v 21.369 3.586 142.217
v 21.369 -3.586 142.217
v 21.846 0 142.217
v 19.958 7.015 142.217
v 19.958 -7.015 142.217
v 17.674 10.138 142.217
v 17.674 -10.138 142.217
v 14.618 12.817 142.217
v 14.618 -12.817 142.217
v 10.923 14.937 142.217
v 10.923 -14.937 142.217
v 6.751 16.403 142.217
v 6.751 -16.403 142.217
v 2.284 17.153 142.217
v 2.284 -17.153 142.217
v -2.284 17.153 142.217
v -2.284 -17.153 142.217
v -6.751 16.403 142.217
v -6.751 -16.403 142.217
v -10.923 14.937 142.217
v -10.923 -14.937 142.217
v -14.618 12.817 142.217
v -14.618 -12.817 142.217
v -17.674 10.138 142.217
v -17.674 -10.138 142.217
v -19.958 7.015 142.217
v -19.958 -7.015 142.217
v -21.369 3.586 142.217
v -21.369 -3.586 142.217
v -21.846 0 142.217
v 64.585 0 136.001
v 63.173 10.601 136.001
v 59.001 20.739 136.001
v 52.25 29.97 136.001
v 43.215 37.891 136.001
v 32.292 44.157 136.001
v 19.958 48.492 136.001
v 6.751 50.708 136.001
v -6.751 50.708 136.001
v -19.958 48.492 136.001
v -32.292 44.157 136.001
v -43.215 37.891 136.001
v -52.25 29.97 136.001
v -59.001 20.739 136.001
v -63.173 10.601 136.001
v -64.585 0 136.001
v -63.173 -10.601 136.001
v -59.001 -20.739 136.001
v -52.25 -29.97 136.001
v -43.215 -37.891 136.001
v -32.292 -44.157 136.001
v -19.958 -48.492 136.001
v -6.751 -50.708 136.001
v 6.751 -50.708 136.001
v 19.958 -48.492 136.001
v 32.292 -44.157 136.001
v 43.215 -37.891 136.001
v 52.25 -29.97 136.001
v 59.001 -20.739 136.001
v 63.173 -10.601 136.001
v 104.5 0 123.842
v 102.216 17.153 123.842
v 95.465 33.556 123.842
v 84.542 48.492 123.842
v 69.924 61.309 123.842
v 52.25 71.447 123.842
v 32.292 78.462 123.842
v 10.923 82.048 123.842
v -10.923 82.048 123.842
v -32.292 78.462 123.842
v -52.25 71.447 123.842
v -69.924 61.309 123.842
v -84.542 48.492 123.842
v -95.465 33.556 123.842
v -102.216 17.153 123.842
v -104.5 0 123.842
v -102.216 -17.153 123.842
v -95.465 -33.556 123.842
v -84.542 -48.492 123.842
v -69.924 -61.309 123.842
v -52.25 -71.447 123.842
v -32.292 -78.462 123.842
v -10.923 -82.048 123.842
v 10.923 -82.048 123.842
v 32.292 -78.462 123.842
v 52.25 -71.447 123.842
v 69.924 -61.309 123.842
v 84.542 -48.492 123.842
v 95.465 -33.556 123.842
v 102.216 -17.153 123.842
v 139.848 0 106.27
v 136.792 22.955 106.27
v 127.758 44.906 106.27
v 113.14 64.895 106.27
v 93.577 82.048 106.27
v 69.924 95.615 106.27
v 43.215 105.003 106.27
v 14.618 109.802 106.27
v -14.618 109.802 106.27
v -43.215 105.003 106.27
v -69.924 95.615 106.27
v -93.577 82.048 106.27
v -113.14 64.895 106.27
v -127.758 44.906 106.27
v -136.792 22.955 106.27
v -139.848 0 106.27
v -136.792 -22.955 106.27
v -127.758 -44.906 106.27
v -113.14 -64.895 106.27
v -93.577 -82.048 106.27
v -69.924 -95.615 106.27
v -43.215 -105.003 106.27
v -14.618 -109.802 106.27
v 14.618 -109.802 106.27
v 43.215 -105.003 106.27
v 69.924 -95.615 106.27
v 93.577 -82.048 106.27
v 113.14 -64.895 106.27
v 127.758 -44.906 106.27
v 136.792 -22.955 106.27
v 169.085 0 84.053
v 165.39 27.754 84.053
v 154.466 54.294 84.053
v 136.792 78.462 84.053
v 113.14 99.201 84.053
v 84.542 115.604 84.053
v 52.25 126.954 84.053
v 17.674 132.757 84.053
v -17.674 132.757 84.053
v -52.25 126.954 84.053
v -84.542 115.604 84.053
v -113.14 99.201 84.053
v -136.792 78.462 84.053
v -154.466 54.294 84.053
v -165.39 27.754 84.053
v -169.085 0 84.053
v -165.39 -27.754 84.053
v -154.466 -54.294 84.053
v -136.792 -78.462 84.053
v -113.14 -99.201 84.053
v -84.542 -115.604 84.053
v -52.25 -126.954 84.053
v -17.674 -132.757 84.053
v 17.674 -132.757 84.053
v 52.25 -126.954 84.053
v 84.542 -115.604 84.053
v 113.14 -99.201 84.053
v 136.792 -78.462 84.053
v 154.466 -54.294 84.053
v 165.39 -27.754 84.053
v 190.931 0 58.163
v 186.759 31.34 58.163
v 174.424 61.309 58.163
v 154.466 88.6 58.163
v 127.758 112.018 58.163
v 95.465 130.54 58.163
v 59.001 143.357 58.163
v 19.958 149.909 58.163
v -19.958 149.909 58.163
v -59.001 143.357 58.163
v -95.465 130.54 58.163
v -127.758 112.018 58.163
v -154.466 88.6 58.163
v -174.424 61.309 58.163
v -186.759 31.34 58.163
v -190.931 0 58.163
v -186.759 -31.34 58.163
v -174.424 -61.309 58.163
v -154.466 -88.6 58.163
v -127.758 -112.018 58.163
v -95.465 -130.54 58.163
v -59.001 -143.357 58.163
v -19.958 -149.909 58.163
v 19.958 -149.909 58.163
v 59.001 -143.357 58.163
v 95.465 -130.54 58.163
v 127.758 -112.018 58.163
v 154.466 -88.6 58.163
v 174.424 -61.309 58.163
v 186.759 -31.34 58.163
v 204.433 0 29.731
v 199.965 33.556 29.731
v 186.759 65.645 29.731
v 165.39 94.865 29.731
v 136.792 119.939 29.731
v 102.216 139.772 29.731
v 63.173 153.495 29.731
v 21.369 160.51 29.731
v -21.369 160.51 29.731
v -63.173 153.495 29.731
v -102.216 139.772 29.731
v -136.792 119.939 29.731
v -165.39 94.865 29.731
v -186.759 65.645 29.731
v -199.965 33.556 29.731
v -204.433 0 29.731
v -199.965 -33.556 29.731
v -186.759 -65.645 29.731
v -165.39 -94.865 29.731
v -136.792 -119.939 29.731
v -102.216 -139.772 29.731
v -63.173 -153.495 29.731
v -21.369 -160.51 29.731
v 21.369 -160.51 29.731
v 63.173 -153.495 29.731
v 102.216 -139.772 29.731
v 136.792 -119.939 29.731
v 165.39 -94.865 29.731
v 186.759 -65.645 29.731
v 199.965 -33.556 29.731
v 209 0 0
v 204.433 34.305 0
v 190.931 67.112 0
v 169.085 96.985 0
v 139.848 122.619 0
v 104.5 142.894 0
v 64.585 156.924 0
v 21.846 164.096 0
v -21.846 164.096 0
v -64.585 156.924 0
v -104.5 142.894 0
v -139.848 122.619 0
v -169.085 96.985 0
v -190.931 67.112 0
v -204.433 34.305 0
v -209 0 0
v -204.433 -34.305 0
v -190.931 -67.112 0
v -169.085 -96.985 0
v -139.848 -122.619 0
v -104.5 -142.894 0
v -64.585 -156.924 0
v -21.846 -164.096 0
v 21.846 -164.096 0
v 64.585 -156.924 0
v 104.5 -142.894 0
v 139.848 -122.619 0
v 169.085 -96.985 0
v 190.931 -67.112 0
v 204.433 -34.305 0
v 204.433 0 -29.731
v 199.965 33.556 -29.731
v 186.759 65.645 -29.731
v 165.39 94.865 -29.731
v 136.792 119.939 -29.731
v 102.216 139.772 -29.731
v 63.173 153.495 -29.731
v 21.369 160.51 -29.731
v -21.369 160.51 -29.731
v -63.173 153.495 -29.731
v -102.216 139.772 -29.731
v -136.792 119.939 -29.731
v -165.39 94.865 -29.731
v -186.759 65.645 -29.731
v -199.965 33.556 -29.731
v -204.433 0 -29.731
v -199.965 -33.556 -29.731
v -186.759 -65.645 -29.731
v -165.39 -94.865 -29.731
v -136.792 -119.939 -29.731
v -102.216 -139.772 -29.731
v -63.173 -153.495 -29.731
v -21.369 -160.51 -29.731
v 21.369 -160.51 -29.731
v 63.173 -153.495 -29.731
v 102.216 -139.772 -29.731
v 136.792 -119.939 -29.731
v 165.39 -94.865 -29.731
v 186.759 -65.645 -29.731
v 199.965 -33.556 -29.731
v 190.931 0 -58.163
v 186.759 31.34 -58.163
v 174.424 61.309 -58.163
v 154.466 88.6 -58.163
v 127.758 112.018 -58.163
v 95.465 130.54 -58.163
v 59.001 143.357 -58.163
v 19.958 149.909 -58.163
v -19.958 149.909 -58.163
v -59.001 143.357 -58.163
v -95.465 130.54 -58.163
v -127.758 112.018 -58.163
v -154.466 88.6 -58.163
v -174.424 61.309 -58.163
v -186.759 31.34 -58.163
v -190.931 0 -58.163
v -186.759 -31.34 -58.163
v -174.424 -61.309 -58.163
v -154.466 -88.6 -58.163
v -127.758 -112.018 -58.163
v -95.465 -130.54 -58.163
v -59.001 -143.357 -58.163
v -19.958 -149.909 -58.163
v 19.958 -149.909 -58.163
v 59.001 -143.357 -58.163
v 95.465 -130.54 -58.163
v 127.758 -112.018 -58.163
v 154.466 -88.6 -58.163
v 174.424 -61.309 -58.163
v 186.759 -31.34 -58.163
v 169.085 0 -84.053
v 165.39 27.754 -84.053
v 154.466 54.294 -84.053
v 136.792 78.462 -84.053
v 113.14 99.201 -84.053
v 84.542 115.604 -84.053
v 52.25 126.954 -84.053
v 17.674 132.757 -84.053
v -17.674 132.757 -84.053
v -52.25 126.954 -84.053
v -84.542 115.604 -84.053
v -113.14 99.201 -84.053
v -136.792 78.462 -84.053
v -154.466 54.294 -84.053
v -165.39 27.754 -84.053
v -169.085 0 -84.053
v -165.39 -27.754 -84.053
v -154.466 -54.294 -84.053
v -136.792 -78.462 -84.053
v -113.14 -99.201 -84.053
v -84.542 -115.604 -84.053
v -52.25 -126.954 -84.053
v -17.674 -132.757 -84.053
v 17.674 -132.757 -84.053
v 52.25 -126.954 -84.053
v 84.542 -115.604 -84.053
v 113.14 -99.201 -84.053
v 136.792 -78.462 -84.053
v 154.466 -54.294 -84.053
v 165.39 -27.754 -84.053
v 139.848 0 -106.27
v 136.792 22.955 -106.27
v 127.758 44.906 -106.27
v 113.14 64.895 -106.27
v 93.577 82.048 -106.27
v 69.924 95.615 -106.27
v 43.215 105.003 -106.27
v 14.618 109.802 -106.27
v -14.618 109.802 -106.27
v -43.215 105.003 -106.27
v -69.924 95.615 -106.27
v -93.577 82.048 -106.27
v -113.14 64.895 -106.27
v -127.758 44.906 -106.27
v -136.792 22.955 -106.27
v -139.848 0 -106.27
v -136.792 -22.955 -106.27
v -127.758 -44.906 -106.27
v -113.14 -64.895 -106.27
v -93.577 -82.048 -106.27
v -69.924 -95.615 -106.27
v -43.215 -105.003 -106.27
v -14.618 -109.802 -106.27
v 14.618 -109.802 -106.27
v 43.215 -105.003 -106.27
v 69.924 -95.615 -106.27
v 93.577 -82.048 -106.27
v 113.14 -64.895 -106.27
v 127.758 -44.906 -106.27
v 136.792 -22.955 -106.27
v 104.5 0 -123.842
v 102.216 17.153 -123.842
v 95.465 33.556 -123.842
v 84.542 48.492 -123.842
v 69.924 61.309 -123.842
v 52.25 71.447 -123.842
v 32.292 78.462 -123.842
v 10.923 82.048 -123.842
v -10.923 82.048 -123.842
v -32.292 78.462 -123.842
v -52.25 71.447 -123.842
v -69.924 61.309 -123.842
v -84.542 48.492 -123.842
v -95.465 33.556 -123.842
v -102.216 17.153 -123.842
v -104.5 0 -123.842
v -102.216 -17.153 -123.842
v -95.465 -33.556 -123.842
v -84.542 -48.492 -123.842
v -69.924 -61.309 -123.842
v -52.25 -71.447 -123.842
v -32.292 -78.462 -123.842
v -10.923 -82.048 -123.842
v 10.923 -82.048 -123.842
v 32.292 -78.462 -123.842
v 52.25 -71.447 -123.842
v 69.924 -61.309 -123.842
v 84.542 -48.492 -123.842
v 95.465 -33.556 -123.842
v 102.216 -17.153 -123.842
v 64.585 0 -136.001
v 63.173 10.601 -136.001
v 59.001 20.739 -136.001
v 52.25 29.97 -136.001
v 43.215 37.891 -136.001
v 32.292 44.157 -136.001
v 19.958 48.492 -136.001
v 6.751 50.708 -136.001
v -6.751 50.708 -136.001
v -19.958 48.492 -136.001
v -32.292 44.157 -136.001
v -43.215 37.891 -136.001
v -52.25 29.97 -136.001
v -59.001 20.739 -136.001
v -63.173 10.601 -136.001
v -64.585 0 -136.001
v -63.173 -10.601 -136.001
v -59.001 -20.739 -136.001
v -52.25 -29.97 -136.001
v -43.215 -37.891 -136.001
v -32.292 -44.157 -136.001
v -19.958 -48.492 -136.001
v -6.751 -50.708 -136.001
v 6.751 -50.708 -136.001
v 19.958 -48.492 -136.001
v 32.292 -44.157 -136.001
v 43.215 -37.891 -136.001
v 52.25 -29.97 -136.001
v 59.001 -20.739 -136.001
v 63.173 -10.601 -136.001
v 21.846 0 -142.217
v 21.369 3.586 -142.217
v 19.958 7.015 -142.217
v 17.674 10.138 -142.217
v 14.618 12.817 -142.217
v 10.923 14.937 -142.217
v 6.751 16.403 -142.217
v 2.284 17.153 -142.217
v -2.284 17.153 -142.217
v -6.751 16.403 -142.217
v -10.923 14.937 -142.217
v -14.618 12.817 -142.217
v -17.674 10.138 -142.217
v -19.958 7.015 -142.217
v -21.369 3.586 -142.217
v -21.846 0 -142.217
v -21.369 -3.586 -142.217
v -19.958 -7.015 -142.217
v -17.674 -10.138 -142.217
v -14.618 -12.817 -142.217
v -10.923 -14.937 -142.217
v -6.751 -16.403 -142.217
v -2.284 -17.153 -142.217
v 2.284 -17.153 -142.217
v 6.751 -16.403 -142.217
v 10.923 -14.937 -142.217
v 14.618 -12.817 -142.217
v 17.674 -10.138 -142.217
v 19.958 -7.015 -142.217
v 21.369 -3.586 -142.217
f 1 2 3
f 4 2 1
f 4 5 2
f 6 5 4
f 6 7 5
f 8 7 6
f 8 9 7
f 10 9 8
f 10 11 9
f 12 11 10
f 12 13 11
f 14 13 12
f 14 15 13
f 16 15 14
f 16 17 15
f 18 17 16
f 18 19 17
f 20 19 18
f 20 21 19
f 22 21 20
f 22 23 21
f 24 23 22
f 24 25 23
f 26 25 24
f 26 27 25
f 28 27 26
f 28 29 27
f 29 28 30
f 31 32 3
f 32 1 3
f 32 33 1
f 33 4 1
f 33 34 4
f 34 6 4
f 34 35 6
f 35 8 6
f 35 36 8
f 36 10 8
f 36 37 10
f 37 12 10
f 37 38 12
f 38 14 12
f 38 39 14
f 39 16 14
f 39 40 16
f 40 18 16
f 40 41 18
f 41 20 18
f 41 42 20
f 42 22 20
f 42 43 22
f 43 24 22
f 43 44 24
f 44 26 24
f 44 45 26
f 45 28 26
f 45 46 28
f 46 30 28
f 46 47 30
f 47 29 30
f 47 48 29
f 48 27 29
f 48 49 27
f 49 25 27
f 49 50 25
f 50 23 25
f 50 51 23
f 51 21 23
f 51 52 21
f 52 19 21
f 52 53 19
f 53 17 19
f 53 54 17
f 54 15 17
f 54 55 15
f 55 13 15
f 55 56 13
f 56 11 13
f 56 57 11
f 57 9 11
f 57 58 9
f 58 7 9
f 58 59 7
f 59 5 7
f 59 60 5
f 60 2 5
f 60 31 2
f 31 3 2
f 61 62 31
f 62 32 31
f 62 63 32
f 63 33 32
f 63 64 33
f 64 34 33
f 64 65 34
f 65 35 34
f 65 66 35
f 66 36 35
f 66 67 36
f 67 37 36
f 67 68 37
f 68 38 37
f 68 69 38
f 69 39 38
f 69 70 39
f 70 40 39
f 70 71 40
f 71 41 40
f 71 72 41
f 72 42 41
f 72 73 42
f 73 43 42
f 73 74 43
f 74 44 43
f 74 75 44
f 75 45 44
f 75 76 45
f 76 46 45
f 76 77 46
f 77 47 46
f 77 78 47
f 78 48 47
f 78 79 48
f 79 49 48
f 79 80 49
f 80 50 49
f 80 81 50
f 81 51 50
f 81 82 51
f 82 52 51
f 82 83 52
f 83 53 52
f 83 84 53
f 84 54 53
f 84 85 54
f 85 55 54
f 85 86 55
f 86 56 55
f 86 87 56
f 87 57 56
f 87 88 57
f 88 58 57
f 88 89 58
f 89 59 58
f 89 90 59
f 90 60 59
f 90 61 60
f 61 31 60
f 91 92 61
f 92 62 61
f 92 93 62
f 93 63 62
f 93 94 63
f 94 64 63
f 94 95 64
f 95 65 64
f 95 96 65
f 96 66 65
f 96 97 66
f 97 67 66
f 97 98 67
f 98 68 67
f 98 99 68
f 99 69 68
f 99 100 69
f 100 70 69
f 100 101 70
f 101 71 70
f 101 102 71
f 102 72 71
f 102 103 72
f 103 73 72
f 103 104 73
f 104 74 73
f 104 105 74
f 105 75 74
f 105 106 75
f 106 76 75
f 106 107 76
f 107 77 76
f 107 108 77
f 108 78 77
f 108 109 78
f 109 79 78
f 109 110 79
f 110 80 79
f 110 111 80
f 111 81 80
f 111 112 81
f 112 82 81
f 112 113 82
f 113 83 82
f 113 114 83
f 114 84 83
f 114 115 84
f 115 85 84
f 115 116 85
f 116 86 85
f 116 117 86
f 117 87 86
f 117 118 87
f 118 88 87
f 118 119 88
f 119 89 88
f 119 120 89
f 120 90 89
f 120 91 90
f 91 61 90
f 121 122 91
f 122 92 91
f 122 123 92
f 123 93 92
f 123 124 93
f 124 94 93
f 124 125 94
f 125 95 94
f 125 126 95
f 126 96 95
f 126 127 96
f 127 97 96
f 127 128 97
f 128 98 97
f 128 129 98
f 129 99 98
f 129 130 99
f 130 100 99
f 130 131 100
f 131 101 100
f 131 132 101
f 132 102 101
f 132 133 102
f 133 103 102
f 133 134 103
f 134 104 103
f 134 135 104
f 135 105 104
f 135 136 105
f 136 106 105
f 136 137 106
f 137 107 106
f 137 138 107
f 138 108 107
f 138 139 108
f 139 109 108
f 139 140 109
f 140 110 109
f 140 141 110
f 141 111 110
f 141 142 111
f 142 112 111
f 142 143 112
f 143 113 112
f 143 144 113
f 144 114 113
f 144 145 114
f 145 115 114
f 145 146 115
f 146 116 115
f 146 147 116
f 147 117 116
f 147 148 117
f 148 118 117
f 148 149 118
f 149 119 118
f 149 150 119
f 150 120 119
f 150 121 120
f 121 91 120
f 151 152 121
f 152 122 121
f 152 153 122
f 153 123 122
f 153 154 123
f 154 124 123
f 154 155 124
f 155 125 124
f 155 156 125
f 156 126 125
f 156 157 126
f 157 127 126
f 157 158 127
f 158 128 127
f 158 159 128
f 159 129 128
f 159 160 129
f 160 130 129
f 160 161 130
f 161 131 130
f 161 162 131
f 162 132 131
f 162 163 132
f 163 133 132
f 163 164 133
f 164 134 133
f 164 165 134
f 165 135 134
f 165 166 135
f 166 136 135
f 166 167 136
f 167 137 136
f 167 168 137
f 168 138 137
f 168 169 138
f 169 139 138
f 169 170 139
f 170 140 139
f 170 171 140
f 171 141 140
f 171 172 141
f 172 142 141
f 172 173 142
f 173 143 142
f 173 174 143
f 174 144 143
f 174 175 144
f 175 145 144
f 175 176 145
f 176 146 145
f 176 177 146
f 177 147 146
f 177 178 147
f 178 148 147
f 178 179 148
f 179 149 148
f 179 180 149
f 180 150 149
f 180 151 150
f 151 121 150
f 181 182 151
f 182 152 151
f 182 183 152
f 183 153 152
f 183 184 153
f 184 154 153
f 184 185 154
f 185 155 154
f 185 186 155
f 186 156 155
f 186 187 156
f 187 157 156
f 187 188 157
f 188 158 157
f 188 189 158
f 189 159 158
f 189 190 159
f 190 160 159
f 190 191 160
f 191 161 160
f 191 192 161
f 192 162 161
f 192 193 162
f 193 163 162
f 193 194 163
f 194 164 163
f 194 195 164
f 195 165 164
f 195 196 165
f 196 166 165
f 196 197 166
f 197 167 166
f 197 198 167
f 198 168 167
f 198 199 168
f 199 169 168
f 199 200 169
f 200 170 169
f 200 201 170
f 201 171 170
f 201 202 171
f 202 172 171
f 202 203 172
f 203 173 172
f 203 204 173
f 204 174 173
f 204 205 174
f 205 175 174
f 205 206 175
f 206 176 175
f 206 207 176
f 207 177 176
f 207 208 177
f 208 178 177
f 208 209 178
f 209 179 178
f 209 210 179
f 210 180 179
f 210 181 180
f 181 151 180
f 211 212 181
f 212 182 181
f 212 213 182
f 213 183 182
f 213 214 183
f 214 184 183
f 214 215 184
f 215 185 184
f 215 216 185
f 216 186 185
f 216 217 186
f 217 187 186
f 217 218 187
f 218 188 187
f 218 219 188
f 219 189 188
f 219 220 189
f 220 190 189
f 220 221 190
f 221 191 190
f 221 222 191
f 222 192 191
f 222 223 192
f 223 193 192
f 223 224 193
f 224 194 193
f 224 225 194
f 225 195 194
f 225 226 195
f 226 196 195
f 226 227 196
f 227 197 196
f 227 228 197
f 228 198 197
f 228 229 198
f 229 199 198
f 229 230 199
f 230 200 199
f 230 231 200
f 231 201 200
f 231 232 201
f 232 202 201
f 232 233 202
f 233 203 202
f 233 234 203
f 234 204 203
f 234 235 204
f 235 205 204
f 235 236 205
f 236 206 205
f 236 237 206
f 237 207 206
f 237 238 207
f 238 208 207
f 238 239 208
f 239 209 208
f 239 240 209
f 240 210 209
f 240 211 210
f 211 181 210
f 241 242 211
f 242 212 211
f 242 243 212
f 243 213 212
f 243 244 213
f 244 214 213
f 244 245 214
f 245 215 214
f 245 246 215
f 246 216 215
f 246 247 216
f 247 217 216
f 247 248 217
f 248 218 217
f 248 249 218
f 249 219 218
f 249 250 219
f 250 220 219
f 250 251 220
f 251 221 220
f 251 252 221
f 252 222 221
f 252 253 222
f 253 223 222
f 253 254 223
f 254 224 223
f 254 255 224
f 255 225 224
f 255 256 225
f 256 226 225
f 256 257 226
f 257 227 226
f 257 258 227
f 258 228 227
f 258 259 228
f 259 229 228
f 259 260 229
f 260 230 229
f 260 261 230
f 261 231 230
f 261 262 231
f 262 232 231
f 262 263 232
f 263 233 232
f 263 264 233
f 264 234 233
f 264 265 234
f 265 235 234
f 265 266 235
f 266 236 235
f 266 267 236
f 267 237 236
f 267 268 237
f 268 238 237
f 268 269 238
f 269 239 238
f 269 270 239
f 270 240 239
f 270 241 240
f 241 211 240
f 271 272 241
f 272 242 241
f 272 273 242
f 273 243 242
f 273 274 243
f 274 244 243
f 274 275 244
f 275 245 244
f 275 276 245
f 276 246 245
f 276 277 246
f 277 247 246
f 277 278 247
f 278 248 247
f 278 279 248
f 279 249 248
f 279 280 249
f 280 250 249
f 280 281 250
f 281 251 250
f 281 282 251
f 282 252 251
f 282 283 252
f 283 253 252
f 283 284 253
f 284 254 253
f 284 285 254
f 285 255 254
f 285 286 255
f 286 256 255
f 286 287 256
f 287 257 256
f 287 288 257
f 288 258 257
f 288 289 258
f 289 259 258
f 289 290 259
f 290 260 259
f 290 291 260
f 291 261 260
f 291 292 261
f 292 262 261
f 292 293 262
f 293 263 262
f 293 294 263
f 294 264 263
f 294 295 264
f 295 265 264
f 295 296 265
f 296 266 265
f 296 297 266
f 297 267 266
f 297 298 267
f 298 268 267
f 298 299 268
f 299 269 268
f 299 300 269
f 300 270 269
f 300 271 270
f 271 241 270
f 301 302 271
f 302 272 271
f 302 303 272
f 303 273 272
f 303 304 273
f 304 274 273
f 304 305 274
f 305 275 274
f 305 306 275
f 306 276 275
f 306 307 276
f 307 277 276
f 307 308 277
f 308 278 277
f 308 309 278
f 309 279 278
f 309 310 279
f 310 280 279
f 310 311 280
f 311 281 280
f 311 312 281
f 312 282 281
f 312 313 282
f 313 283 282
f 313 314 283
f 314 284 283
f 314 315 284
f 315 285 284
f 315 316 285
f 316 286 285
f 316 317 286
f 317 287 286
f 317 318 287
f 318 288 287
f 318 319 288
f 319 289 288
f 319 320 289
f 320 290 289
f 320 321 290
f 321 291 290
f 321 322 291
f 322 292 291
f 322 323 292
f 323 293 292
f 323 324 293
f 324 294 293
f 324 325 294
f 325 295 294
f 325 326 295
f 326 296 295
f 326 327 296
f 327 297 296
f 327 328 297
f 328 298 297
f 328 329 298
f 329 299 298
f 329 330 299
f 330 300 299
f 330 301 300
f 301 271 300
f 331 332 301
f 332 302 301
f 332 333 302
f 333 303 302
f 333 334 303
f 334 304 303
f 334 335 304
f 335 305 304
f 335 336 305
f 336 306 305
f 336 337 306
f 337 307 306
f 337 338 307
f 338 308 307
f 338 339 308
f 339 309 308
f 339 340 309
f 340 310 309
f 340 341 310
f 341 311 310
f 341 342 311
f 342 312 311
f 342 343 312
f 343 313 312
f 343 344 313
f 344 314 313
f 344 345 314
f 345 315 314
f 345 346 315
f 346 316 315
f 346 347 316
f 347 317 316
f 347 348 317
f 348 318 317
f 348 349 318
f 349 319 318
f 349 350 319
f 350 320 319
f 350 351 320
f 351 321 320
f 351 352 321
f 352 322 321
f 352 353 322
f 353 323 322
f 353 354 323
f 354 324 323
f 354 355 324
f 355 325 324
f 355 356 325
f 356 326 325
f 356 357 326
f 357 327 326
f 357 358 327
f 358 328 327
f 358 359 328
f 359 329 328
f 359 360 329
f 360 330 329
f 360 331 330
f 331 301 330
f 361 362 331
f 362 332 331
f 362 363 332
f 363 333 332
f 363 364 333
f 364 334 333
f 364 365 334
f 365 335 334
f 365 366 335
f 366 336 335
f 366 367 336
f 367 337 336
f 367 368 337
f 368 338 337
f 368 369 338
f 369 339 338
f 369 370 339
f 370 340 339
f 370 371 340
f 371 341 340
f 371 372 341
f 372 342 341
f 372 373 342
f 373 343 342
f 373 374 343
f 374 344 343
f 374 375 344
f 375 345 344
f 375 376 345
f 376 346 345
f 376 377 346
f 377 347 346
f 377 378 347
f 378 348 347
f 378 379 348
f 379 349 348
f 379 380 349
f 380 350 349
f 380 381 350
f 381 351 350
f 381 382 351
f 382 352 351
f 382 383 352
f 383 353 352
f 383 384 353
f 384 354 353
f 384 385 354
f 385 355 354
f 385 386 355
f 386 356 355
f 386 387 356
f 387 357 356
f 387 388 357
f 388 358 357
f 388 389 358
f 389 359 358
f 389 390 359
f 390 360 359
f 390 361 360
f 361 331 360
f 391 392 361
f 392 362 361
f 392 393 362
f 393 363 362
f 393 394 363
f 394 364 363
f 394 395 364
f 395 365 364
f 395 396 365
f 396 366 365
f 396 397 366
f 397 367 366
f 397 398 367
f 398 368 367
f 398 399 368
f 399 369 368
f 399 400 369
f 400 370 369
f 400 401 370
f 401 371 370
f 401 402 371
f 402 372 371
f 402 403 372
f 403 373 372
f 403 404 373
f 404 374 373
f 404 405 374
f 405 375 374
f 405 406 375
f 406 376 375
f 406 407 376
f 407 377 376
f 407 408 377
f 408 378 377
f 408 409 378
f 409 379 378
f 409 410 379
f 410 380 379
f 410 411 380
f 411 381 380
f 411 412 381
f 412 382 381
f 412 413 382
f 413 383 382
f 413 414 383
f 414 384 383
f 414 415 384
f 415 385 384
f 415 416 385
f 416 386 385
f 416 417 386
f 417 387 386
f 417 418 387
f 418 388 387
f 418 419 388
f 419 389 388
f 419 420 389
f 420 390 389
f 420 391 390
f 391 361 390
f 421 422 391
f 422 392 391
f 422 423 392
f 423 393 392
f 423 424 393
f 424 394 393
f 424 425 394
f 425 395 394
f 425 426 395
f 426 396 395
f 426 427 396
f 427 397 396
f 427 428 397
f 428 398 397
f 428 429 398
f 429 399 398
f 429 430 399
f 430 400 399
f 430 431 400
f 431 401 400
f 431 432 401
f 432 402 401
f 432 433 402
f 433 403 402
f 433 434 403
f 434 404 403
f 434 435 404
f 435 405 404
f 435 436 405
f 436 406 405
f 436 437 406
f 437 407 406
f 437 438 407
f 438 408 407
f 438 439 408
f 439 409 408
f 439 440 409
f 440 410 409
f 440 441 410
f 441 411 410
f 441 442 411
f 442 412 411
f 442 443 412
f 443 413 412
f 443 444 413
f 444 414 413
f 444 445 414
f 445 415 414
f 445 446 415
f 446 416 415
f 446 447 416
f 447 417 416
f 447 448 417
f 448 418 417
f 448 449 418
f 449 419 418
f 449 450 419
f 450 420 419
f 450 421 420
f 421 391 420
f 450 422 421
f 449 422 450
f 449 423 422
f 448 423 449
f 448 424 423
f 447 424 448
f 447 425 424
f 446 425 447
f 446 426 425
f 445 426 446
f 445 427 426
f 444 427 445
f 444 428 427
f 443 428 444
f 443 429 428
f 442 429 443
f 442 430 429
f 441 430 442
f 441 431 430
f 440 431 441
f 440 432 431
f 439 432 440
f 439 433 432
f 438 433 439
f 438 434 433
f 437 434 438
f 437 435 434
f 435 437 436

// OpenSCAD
// Generated by SolidPython 1.0.1 on 2020-07-29 00:46:54


scale(v = [19, 15, 13]) {
	sphere(r = 11);
}
/***********************************************
*********      SolidPython code:      **********
************************************************
 
# import packages: SolidPython
from solid import *
from solid.utils import *
from itertools import chain, combinations, permutations


class Resize:

    def __init__(self, scad_file):
        self.scad_file = scad_file
        #self.scad_file = import_scad(scad_file)
        # cone/cylinder param:
        self.r1 = 0
        self.r2 = 0
        self.h = 0
        # rectangular prism param:
        self.w = 0
        self.l = 0
        # ellipse param:
        self.r = 0

    # import OpenScad code (file name corresponds to shape)


    # classify shape + parameters
    def assign(self, param1, param2, param3):
        if self.scad_file == 'cone.scad':
            self.r1 = param1
            self.r2 = param2
            self.h = param3
        elif self.scad_file == 'cylinder.scad':
            self.r1 = param1
            self.r2 = param2
            self.h = param3
        elif self.scad_file == 'rectangularPrism.scad':
            self.h = param1
            self.l = param2
            self.w = param3
        else:
            self.r = param1
            self.h = param2

    # resize parameters
    def iterate(self):
        x = range(3, 20, 2)
        i = 1
        if self.scad_file == 'cone.scad':
            tempList = list(permutations(x, 2))
            for temp in tempList:
                param1 = temp[0]
                param2 = temp[1]
                filepath = 'produced_scad_files/' + 'cone' + str(param1) + '_' + str(param2) + '_' + '.scad'
                scad_render_to_file(cylinder(h=param1, r1=param2, r2=0), filepath)

        elif self.scad_file == 'cylinder.scad':
            tempList = list(permutations(x, 3))
            for temp in tempList:
                param1 = temp[0]
                param2 = temp[1]
                filepath = 'produced_scad_files/' + 'cylinder' + str(param1) + '_' + str(param2) + '_' + '.scad'
                scad_render_to_file(cylinder(h=param1, r1=param2, r2=param2), filepath)

        elif self.scad_file == 'rectangularPrism.scad':
            tempList = list(permutations(x, 3))
            for temp in tempList:
                param1 = temp[0]
                param2 = temp[1]
                param3 = temp[2]
                filepath = 'produced_scad_files/' + 'rectangularPrism' + str(param1) + '_' + str(param2) + '_' + str(
                    param3) + '.scad'
                scad_render_to_file(cube(size=(param1, param2, param3)), filepath)

        elif self.scad_file == 'ellipse.scad':
            tempList = list(permutations(x, 4))
            for temp in tempList:
                param1 = temp[0]
                param2 = temp[1]
                param3 = temp[2]
                param4 = temp[3]
                filepath = 'produced_scad_files/' + 'ellipse' + str(param1) + '_' + str(param2) + '_' + str(param3) + '_' + str(param4) + '.scad'
                scad_render_to_file(scale([param1, param2, param3])(sphere(r=param4)), filepath)

    def render_to_scadfile(self):
        scad_render_to_file(scad, 'example.scad') 
 
************************************************/
